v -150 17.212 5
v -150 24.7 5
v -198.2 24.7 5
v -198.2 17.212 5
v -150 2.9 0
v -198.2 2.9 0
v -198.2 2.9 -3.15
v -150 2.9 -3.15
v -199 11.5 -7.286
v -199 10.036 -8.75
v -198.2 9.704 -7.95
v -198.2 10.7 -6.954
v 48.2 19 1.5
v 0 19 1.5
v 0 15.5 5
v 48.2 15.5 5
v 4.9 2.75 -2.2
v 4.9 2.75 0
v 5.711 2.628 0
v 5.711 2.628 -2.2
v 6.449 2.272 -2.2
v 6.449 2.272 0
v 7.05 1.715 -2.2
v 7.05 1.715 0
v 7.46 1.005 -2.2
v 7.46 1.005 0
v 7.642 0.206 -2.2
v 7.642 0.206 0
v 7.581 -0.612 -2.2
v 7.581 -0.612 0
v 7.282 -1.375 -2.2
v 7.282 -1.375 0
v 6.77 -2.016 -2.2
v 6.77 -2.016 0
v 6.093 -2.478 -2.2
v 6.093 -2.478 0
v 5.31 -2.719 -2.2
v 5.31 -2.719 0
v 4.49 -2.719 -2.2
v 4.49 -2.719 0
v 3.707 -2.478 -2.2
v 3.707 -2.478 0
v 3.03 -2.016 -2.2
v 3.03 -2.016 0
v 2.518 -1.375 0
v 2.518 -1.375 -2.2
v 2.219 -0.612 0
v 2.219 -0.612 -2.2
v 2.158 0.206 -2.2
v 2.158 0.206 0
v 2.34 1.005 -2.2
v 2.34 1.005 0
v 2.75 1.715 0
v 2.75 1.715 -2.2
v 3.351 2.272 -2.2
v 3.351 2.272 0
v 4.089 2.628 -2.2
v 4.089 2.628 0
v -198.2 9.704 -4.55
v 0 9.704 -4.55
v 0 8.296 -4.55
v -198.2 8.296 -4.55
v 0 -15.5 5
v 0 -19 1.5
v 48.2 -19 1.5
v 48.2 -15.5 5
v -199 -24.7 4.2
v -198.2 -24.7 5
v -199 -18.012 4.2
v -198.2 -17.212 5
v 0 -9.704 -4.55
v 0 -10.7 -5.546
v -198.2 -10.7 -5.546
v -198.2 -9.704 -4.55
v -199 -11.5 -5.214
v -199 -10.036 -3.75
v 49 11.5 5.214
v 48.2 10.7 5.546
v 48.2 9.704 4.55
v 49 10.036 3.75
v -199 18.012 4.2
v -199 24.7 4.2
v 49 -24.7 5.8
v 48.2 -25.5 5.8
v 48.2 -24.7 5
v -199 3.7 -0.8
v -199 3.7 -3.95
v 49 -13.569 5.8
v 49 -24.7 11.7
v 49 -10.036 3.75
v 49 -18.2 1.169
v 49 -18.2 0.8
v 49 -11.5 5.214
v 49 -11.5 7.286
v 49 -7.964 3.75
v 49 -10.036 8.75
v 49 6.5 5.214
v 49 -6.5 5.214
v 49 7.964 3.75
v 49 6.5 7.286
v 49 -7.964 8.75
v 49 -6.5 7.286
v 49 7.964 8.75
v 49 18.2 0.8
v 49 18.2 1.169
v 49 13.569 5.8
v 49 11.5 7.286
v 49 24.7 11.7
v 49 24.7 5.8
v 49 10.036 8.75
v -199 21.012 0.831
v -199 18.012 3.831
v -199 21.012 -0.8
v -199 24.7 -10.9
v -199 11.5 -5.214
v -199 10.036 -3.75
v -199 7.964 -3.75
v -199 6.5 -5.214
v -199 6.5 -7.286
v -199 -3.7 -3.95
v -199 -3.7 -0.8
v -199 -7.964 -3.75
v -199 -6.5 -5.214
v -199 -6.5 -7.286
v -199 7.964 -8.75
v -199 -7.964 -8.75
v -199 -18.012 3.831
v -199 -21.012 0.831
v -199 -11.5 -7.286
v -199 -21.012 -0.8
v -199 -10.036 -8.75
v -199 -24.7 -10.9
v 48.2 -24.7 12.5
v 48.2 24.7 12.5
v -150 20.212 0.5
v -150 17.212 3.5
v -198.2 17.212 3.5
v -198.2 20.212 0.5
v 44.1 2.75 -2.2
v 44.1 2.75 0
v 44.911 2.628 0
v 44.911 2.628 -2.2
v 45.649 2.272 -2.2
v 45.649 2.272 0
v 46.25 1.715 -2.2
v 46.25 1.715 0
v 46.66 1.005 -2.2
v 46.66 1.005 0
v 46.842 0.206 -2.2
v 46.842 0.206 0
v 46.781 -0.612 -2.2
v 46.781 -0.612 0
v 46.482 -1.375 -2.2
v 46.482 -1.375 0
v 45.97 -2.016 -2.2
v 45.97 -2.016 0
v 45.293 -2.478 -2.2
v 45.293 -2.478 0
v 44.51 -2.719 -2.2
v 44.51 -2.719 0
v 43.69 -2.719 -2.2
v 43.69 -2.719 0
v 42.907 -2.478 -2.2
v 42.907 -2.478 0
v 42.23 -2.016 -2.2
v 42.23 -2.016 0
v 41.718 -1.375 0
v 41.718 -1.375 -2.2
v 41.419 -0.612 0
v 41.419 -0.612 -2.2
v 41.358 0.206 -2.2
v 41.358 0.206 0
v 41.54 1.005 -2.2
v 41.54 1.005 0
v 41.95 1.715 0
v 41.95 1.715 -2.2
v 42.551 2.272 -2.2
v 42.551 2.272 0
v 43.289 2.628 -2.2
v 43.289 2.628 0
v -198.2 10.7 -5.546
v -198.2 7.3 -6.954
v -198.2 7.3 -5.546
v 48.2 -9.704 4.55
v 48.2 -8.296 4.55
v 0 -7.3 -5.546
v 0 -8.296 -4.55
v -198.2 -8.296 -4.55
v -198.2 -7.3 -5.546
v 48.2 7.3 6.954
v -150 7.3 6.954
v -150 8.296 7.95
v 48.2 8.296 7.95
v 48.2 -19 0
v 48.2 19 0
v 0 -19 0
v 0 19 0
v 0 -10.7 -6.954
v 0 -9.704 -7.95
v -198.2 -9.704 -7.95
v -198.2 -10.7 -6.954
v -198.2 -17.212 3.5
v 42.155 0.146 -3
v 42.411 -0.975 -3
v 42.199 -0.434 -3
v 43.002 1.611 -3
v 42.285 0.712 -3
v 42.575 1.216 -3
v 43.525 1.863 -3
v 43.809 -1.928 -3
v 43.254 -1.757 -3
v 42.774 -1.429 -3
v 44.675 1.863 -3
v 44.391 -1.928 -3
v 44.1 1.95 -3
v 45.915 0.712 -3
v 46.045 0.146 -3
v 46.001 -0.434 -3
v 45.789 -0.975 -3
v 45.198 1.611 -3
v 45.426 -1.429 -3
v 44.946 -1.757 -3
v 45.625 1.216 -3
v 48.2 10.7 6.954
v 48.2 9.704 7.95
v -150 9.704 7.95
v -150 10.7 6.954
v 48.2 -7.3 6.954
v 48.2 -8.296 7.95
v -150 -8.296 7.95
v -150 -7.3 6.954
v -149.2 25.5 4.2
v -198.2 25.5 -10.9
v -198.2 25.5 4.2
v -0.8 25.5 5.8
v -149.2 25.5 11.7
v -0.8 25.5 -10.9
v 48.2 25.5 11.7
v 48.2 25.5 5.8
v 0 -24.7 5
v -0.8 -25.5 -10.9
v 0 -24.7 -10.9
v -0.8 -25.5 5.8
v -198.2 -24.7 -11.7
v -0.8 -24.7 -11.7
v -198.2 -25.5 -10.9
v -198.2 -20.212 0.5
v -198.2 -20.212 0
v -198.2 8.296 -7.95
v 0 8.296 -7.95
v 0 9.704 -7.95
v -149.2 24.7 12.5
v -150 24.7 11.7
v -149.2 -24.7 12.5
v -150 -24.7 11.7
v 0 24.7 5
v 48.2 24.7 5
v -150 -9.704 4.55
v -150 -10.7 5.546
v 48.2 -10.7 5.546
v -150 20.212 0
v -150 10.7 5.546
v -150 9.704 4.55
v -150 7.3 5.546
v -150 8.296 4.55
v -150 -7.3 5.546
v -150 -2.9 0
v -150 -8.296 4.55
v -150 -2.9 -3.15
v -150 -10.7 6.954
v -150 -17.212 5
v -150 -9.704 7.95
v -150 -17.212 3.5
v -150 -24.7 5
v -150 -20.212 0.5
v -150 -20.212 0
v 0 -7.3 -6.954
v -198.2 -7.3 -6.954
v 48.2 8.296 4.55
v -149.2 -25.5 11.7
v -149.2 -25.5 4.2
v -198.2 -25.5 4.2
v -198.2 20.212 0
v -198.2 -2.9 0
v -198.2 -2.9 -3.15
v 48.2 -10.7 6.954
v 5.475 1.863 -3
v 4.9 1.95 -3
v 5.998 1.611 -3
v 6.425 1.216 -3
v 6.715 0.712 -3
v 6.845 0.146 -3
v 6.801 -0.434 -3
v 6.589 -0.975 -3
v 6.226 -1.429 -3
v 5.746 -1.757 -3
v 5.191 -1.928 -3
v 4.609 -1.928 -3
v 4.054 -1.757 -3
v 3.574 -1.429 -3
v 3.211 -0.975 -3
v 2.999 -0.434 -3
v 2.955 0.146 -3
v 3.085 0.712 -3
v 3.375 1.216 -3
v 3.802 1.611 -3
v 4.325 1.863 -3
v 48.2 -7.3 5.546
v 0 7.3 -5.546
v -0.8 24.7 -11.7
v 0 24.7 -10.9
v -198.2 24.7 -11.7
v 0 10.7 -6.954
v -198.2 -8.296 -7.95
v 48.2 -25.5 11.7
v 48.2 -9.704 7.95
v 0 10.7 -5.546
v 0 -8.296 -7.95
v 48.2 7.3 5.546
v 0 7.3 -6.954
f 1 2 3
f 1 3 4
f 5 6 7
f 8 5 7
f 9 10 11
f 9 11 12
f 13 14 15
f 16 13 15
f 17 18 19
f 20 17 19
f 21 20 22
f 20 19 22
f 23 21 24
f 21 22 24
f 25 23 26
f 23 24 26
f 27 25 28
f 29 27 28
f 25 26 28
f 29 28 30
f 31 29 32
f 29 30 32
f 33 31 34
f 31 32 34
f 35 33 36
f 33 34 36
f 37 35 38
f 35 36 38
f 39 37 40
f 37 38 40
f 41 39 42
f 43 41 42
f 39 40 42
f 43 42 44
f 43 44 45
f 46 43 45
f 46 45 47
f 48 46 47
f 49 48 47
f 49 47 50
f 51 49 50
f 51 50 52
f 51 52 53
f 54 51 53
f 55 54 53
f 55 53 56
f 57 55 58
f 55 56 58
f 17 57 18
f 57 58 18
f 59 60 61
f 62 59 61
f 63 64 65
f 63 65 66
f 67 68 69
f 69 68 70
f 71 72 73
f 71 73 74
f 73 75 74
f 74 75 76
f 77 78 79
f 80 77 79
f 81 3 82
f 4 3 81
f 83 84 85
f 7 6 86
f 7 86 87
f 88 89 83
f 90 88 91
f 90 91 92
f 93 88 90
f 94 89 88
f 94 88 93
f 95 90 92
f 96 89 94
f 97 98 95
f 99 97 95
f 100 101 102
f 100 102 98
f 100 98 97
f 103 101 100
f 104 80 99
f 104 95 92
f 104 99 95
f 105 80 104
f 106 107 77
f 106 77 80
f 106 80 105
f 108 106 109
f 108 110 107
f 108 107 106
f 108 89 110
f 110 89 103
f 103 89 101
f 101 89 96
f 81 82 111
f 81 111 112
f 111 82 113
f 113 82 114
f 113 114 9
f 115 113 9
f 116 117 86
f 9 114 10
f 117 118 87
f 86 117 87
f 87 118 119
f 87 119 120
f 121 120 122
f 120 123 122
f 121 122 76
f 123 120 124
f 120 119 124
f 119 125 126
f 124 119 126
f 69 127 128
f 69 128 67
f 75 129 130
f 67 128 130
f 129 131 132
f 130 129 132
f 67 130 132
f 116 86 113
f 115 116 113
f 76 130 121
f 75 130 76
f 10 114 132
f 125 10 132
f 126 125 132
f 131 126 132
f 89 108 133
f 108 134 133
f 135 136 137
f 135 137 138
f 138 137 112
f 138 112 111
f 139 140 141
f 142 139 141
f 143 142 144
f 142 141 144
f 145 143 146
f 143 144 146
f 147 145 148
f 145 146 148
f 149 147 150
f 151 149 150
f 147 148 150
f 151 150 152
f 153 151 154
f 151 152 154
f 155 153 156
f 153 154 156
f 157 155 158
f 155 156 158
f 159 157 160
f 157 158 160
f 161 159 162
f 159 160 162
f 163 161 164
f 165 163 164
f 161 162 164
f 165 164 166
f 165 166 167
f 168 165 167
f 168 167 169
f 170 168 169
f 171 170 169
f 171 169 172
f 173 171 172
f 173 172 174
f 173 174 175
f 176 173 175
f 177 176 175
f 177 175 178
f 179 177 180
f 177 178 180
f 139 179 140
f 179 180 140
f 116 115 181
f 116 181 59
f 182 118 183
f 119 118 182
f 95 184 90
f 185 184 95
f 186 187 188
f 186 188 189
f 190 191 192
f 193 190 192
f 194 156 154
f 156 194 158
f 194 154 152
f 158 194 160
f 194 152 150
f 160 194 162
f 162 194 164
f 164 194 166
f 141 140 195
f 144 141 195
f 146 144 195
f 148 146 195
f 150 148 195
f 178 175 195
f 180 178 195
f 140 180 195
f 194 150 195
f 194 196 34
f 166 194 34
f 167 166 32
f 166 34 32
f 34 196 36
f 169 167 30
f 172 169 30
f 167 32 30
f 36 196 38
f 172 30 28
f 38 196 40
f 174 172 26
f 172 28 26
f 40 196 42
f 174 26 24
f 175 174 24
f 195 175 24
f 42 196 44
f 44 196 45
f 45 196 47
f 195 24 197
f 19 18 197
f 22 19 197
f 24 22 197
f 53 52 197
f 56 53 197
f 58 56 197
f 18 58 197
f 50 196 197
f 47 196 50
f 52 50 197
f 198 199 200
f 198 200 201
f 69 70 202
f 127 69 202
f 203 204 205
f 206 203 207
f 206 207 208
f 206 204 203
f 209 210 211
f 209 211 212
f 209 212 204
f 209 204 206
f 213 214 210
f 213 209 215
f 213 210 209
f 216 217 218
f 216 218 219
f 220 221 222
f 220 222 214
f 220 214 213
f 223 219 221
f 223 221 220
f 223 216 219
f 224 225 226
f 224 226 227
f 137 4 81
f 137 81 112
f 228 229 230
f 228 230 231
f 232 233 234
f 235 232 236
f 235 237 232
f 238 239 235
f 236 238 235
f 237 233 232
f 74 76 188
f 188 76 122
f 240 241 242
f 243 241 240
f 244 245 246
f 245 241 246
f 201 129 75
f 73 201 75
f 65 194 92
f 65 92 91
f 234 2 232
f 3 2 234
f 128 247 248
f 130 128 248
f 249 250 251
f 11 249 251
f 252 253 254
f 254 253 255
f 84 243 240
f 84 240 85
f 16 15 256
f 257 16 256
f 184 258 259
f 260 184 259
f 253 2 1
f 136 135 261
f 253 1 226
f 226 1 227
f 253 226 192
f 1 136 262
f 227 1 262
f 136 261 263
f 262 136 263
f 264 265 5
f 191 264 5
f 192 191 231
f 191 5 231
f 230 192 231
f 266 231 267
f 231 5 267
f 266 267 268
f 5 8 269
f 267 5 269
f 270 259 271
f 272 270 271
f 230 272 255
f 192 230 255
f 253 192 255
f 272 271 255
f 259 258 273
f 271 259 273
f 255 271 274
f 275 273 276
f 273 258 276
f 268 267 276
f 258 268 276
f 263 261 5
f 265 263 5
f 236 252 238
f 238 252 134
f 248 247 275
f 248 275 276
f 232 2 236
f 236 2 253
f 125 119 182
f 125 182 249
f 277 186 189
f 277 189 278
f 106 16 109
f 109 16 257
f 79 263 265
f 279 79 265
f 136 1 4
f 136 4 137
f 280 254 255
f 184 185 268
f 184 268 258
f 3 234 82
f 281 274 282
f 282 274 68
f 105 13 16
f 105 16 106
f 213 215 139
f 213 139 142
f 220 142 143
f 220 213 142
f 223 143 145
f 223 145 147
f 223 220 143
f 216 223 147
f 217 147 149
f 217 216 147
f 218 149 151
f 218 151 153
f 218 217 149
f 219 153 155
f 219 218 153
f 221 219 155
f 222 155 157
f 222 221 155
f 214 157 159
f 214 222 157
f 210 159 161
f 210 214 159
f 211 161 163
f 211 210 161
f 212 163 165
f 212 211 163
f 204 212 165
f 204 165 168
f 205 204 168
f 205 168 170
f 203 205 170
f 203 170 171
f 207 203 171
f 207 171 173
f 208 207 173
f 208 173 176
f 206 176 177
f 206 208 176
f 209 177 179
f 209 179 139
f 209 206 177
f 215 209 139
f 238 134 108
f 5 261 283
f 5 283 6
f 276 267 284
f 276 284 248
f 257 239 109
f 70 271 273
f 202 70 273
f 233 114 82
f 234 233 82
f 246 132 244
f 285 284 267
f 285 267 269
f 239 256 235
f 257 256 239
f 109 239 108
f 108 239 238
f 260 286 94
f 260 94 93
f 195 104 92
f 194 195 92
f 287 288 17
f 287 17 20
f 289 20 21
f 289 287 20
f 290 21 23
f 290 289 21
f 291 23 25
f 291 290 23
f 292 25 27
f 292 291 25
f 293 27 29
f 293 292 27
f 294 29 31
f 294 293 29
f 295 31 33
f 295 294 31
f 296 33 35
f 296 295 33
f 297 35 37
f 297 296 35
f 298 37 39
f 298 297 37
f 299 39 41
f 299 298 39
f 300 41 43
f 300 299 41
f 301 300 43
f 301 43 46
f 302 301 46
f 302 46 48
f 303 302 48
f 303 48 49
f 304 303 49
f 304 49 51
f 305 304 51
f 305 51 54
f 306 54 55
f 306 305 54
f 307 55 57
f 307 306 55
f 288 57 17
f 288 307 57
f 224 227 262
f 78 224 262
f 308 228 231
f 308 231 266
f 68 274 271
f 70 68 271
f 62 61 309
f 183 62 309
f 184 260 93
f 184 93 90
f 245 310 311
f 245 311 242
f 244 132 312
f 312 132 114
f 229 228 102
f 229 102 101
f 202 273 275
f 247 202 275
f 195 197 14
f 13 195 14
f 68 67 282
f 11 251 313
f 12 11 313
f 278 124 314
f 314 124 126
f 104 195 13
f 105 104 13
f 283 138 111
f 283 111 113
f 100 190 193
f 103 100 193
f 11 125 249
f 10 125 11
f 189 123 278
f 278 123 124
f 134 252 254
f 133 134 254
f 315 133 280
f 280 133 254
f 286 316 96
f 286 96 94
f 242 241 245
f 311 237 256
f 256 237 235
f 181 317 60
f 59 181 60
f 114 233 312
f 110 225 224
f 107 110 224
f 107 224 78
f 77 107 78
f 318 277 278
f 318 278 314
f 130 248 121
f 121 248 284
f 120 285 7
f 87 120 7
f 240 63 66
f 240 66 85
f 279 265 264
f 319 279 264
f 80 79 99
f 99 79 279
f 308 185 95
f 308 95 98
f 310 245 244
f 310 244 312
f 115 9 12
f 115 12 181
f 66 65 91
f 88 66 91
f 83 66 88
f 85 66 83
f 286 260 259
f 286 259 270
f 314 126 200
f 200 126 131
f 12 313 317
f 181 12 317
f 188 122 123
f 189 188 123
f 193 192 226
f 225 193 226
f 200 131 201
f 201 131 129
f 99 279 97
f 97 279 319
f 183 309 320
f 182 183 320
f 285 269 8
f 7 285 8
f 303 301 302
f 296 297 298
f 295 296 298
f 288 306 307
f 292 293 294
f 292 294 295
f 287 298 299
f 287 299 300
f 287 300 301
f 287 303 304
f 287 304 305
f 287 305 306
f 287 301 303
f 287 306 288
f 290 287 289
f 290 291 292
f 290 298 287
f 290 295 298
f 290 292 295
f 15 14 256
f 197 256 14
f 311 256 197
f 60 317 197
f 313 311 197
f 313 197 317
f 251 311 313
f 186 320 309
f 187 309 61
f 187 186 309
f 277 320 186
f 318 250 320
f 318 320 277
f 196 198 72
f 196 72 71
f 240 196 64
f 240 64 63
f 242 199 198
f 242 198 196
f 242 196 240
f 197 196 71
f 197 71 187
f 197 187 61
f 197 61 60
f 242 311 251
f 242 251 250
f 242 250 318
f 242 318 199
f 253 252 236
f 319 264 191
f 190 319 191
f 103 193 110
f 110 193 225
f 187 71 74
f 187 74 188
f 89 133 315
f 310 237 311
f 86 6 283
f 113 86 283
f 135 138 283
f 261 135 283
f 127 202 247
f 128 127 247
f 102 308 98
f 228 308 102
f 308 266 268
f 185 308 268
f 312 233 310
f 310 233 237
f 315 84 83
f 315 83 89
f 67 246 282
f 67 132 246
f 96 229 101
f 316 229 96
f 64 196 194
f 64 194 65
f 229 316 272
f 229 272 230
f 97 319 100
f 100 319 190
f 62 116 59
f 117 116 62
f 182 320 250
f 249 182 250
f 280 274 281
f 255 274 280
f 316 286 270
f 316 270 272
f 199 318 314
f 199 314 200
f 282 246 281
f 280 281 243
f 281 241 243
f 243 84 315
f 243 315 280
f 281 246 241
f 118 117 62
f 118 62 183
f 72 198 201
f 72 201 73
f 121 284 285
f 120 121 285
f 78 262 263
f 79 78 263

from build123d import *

# Parameters (mm, degrees)
PAD_DEPTH    = 49
PAD001_DEPTH = 150
PAD002_DEPTH = 49
SKETCH003_R  = 2.75
PAD003_DEPTH = 3
SKETCH004_W  = 5.8
SKETCH004_H  = 3.15
POCKET_DEPTH = 49
CHAMFER_SIZE = 0.8


with BuildPart() as part:
    # Sketch → Pad (new body)
    with BuildSketch(Plane.YZ):
        Polygon((0, 0), (-19, 0), (-19, 1.5), (-15.5, 5), (-25.5, 5), (-25.5, 12.5), (0, 12.5), align=None)
        Polygon((-10.7, 6.954163), (-10.7, 5.545837), (-9.704163, 4.55), (-8.295837, 4.55), (-7.3, 5.545837), (-7.3, 6.954163), (-8.295837, 7.95), (-9.704163, 7.95), align=None, mode=Mode.SUBTRACT)
    pad = extrude(amount=PAD_DEPTH)

    # Sketch001 (on Face16 of Pad) → Pad001 (join)
    with BuildSketch(Plane(origin=(0, 0, 0), x_dir=(0, 1, 0), z_dir=(-1, 0, 0))):
        Polygon((0, 0), (0, 11.7), (-25.5, 11.7), (-25.5, -12.5), (0, -12.5), align=None)
        Polygon((-9.704163, -4.55), (-10.7, -5.545837), (-10.7, -6.954163), (-9.704163, -7.95), (-8.295837, -7.95), (-7.3, -6.954163), (-7.3, -5.545837), (-8.295837, -4.55), align=None, mode=Mode.SUBTRACT)
        Polygon((-9.704163, 7.95), (-10.7, 6.954163), (-10.7, 5.545837), (-9.704163, 4.55), (-8.295837, 4.55), (-7.3, 5.545837), (-7.3, 6.954163), (-8.295837, 7.95), align=None, mode=Mode.SUBTRACT)
    pad001 = extrude(amount=PAD001_DEPTH)

    # Sketch002 (on Face16 of Pad001) → Pad002 (join)
    with BuildSketch(Plane(origin=(-150, 0, 0), x_dir=(0, 1, 0), z_dir=(-1, 0, 0))):
        Polygon((0, 11.7), (-25.5, 11.7), (-25.5, -5), (-17.212132, -5), (-17.212132, -3.5), (-20.212132, -0.5), (-20.212132, 0), (0, 0), align=None)
        Polygon((-9.704163, 7.95), (-10.7, 6.954163), (-10.7, 5.545837), (-9.704163, 4.55), (-8.295837, 4.55), (-7.3, 5.545837), (-7.3, 6.954163), (-8.295837, 7.95), align=None, mode=Mode.SUBTRACT)
    pad002 = extrude(amount=PAD002_DEPTH)

    # Mirrored: Pad002, Pad001, Pad across Sketch002 V_Axis
    add(pad002.mirror(Plane(origin=(-150, 0, 0), x_dir=(-1, 0, 0), z_dir=(0, 1, 0))))
    add(pad001.mirror(Plane(origin=(-150, 0, 0), x_dir=(-1, 0, 0), z_dir=(0, 1, 0))))
    add(pad.mirror(Plane(origin=(-150, 0, 0), x_dir=(-1, 0, 0), z_dir=(0, 1, 0))))

    # Sketch003 (on Face30 of Mirrored) → Pad003 (join)
    with BuildSketch(Plane.YX):
        with Locations((0, 44.1)):
            Circle(SKETCH003_R)
        with Locations((0, 4.9)):
            Circle(SKETCH003_R)
    extrude(amount=PAD003_DEPTH)

    # Sketch004 (on Face8 of Pad003) → Pocket (cut)
    with BuildSketch(Plane(origin=(-199, 0, 0), x_dir=(0, 1, 0), z_dir=(-1, 0, 0))):
        with Locations((0, 1.575)):
            Rectangle(SKETCH004_W, SKETCH004_H)
    extrude(amount=-POCKET_DEPTH, mode=Mode.SUBTRACT)

    # Chamfer
    chamfer_edges = [part.edges().sort_by_distance(p)[0] for p in [
        (-50.5, -25.5, 12.5),
        (49, 0, 12.5),
        (-50.5, 25.5, 12.5),
        (-150, 0, 12.5),
        (-99.5, 25.5, -11.7),
        (-199, 25.5, -3.35),
        (-174.5, 25.5, 5),
        (-150, 25.5, 8.75),
        (49, 25.5, 8.75),
        (24.5, 25.5, 5),
        (0, 25.5, -3.35),
        (-199, -17.212132, 4.25),
        (-199, -21.356066, 5),
        (-199, -25.5, -3.35),
        (-199, 0, -11.7),
        (-199, 21.356066, 5),
        (-199, 17.212132, 4.25),
        (-199, 18.712132, 2),
        (-199, 20.212132, 0.25),
        (-199, 11.556066, 0),
        (-199, 2.9, -1.575),
        (-199, 0, -3.15),
        (-199, -2.9, -1.575),
        (-199, -11.556066, 0),
        (-199, -20.212132, 0.25),
        (-199, -18.712132, 2),
        (-199, -10.202082, -7.452082),
        (-199, -9, -7.95),
        (-199, -10.7, -6.25),
        (-199, -7.797918, -7.452082),
        (-199, -10.202082, -5.047918),
        (-199, -7.3, -6.25),
        (-199, -9, -4.55),
        (-199, -7.797918, -5.047918),
        (-199, 10.202082, -7.452082),
        (-199, 9, -7.95),
        (-199, 10.7, -6.25),
        (-199, 7.797918, -7.452082),
        (-199, 10.202082, -5.047918),
        (-199, 7.3, -6.25),
        (-199, 9, -4.55),
        (-199, 7.797918, -5.047918),
        (24.5, -25.5, 5),
        (49, -25.5, 8.75),
        (-150, -25.5, 8.75),
        (-174.5, -25.5, 5),
        (-99.5, -25.5, -11.7),
        (0, -25.5, -3.35),
        (0, 0, -11.7),
        (49, -17.25, 3.25),
        (49, -19, 0.75),
        (49, 0, 0),
        (49, 19, 0.75),
        (49, 17.25, 3.25),
        (49, 20.5, 5),
        (49, -20.5, 5),
        (49, -10.7, 6.25),
        (49, -10.202082, 7.452082),
        (49, -9, 7.95),
        (49, -7.797918, 7.452082),
        (49, -7.3, 6.25),
        (49, -7.797918, 5.047918),
        (49, -9, 4.55),
        (49, -10.202082, 5.047918),
        (49, 10.7, 6.25),
        (49, 10.202082, 5.047918),
        (49, 9, 4.55),
        (49, 7.797918, 5.047918),
        (49, 7.3, 6.25),
        (49, 7.797918, 7.452082),
        (49, 9, 7.95),
        (49, 10.202082, 7.452082),
        (44.1, -2.75, -3),
        (4.9, -2.75, -3),
    ]]
    chamfer(chamfer_edges, length=CHAMFER_SIZE)


solid = part.part
